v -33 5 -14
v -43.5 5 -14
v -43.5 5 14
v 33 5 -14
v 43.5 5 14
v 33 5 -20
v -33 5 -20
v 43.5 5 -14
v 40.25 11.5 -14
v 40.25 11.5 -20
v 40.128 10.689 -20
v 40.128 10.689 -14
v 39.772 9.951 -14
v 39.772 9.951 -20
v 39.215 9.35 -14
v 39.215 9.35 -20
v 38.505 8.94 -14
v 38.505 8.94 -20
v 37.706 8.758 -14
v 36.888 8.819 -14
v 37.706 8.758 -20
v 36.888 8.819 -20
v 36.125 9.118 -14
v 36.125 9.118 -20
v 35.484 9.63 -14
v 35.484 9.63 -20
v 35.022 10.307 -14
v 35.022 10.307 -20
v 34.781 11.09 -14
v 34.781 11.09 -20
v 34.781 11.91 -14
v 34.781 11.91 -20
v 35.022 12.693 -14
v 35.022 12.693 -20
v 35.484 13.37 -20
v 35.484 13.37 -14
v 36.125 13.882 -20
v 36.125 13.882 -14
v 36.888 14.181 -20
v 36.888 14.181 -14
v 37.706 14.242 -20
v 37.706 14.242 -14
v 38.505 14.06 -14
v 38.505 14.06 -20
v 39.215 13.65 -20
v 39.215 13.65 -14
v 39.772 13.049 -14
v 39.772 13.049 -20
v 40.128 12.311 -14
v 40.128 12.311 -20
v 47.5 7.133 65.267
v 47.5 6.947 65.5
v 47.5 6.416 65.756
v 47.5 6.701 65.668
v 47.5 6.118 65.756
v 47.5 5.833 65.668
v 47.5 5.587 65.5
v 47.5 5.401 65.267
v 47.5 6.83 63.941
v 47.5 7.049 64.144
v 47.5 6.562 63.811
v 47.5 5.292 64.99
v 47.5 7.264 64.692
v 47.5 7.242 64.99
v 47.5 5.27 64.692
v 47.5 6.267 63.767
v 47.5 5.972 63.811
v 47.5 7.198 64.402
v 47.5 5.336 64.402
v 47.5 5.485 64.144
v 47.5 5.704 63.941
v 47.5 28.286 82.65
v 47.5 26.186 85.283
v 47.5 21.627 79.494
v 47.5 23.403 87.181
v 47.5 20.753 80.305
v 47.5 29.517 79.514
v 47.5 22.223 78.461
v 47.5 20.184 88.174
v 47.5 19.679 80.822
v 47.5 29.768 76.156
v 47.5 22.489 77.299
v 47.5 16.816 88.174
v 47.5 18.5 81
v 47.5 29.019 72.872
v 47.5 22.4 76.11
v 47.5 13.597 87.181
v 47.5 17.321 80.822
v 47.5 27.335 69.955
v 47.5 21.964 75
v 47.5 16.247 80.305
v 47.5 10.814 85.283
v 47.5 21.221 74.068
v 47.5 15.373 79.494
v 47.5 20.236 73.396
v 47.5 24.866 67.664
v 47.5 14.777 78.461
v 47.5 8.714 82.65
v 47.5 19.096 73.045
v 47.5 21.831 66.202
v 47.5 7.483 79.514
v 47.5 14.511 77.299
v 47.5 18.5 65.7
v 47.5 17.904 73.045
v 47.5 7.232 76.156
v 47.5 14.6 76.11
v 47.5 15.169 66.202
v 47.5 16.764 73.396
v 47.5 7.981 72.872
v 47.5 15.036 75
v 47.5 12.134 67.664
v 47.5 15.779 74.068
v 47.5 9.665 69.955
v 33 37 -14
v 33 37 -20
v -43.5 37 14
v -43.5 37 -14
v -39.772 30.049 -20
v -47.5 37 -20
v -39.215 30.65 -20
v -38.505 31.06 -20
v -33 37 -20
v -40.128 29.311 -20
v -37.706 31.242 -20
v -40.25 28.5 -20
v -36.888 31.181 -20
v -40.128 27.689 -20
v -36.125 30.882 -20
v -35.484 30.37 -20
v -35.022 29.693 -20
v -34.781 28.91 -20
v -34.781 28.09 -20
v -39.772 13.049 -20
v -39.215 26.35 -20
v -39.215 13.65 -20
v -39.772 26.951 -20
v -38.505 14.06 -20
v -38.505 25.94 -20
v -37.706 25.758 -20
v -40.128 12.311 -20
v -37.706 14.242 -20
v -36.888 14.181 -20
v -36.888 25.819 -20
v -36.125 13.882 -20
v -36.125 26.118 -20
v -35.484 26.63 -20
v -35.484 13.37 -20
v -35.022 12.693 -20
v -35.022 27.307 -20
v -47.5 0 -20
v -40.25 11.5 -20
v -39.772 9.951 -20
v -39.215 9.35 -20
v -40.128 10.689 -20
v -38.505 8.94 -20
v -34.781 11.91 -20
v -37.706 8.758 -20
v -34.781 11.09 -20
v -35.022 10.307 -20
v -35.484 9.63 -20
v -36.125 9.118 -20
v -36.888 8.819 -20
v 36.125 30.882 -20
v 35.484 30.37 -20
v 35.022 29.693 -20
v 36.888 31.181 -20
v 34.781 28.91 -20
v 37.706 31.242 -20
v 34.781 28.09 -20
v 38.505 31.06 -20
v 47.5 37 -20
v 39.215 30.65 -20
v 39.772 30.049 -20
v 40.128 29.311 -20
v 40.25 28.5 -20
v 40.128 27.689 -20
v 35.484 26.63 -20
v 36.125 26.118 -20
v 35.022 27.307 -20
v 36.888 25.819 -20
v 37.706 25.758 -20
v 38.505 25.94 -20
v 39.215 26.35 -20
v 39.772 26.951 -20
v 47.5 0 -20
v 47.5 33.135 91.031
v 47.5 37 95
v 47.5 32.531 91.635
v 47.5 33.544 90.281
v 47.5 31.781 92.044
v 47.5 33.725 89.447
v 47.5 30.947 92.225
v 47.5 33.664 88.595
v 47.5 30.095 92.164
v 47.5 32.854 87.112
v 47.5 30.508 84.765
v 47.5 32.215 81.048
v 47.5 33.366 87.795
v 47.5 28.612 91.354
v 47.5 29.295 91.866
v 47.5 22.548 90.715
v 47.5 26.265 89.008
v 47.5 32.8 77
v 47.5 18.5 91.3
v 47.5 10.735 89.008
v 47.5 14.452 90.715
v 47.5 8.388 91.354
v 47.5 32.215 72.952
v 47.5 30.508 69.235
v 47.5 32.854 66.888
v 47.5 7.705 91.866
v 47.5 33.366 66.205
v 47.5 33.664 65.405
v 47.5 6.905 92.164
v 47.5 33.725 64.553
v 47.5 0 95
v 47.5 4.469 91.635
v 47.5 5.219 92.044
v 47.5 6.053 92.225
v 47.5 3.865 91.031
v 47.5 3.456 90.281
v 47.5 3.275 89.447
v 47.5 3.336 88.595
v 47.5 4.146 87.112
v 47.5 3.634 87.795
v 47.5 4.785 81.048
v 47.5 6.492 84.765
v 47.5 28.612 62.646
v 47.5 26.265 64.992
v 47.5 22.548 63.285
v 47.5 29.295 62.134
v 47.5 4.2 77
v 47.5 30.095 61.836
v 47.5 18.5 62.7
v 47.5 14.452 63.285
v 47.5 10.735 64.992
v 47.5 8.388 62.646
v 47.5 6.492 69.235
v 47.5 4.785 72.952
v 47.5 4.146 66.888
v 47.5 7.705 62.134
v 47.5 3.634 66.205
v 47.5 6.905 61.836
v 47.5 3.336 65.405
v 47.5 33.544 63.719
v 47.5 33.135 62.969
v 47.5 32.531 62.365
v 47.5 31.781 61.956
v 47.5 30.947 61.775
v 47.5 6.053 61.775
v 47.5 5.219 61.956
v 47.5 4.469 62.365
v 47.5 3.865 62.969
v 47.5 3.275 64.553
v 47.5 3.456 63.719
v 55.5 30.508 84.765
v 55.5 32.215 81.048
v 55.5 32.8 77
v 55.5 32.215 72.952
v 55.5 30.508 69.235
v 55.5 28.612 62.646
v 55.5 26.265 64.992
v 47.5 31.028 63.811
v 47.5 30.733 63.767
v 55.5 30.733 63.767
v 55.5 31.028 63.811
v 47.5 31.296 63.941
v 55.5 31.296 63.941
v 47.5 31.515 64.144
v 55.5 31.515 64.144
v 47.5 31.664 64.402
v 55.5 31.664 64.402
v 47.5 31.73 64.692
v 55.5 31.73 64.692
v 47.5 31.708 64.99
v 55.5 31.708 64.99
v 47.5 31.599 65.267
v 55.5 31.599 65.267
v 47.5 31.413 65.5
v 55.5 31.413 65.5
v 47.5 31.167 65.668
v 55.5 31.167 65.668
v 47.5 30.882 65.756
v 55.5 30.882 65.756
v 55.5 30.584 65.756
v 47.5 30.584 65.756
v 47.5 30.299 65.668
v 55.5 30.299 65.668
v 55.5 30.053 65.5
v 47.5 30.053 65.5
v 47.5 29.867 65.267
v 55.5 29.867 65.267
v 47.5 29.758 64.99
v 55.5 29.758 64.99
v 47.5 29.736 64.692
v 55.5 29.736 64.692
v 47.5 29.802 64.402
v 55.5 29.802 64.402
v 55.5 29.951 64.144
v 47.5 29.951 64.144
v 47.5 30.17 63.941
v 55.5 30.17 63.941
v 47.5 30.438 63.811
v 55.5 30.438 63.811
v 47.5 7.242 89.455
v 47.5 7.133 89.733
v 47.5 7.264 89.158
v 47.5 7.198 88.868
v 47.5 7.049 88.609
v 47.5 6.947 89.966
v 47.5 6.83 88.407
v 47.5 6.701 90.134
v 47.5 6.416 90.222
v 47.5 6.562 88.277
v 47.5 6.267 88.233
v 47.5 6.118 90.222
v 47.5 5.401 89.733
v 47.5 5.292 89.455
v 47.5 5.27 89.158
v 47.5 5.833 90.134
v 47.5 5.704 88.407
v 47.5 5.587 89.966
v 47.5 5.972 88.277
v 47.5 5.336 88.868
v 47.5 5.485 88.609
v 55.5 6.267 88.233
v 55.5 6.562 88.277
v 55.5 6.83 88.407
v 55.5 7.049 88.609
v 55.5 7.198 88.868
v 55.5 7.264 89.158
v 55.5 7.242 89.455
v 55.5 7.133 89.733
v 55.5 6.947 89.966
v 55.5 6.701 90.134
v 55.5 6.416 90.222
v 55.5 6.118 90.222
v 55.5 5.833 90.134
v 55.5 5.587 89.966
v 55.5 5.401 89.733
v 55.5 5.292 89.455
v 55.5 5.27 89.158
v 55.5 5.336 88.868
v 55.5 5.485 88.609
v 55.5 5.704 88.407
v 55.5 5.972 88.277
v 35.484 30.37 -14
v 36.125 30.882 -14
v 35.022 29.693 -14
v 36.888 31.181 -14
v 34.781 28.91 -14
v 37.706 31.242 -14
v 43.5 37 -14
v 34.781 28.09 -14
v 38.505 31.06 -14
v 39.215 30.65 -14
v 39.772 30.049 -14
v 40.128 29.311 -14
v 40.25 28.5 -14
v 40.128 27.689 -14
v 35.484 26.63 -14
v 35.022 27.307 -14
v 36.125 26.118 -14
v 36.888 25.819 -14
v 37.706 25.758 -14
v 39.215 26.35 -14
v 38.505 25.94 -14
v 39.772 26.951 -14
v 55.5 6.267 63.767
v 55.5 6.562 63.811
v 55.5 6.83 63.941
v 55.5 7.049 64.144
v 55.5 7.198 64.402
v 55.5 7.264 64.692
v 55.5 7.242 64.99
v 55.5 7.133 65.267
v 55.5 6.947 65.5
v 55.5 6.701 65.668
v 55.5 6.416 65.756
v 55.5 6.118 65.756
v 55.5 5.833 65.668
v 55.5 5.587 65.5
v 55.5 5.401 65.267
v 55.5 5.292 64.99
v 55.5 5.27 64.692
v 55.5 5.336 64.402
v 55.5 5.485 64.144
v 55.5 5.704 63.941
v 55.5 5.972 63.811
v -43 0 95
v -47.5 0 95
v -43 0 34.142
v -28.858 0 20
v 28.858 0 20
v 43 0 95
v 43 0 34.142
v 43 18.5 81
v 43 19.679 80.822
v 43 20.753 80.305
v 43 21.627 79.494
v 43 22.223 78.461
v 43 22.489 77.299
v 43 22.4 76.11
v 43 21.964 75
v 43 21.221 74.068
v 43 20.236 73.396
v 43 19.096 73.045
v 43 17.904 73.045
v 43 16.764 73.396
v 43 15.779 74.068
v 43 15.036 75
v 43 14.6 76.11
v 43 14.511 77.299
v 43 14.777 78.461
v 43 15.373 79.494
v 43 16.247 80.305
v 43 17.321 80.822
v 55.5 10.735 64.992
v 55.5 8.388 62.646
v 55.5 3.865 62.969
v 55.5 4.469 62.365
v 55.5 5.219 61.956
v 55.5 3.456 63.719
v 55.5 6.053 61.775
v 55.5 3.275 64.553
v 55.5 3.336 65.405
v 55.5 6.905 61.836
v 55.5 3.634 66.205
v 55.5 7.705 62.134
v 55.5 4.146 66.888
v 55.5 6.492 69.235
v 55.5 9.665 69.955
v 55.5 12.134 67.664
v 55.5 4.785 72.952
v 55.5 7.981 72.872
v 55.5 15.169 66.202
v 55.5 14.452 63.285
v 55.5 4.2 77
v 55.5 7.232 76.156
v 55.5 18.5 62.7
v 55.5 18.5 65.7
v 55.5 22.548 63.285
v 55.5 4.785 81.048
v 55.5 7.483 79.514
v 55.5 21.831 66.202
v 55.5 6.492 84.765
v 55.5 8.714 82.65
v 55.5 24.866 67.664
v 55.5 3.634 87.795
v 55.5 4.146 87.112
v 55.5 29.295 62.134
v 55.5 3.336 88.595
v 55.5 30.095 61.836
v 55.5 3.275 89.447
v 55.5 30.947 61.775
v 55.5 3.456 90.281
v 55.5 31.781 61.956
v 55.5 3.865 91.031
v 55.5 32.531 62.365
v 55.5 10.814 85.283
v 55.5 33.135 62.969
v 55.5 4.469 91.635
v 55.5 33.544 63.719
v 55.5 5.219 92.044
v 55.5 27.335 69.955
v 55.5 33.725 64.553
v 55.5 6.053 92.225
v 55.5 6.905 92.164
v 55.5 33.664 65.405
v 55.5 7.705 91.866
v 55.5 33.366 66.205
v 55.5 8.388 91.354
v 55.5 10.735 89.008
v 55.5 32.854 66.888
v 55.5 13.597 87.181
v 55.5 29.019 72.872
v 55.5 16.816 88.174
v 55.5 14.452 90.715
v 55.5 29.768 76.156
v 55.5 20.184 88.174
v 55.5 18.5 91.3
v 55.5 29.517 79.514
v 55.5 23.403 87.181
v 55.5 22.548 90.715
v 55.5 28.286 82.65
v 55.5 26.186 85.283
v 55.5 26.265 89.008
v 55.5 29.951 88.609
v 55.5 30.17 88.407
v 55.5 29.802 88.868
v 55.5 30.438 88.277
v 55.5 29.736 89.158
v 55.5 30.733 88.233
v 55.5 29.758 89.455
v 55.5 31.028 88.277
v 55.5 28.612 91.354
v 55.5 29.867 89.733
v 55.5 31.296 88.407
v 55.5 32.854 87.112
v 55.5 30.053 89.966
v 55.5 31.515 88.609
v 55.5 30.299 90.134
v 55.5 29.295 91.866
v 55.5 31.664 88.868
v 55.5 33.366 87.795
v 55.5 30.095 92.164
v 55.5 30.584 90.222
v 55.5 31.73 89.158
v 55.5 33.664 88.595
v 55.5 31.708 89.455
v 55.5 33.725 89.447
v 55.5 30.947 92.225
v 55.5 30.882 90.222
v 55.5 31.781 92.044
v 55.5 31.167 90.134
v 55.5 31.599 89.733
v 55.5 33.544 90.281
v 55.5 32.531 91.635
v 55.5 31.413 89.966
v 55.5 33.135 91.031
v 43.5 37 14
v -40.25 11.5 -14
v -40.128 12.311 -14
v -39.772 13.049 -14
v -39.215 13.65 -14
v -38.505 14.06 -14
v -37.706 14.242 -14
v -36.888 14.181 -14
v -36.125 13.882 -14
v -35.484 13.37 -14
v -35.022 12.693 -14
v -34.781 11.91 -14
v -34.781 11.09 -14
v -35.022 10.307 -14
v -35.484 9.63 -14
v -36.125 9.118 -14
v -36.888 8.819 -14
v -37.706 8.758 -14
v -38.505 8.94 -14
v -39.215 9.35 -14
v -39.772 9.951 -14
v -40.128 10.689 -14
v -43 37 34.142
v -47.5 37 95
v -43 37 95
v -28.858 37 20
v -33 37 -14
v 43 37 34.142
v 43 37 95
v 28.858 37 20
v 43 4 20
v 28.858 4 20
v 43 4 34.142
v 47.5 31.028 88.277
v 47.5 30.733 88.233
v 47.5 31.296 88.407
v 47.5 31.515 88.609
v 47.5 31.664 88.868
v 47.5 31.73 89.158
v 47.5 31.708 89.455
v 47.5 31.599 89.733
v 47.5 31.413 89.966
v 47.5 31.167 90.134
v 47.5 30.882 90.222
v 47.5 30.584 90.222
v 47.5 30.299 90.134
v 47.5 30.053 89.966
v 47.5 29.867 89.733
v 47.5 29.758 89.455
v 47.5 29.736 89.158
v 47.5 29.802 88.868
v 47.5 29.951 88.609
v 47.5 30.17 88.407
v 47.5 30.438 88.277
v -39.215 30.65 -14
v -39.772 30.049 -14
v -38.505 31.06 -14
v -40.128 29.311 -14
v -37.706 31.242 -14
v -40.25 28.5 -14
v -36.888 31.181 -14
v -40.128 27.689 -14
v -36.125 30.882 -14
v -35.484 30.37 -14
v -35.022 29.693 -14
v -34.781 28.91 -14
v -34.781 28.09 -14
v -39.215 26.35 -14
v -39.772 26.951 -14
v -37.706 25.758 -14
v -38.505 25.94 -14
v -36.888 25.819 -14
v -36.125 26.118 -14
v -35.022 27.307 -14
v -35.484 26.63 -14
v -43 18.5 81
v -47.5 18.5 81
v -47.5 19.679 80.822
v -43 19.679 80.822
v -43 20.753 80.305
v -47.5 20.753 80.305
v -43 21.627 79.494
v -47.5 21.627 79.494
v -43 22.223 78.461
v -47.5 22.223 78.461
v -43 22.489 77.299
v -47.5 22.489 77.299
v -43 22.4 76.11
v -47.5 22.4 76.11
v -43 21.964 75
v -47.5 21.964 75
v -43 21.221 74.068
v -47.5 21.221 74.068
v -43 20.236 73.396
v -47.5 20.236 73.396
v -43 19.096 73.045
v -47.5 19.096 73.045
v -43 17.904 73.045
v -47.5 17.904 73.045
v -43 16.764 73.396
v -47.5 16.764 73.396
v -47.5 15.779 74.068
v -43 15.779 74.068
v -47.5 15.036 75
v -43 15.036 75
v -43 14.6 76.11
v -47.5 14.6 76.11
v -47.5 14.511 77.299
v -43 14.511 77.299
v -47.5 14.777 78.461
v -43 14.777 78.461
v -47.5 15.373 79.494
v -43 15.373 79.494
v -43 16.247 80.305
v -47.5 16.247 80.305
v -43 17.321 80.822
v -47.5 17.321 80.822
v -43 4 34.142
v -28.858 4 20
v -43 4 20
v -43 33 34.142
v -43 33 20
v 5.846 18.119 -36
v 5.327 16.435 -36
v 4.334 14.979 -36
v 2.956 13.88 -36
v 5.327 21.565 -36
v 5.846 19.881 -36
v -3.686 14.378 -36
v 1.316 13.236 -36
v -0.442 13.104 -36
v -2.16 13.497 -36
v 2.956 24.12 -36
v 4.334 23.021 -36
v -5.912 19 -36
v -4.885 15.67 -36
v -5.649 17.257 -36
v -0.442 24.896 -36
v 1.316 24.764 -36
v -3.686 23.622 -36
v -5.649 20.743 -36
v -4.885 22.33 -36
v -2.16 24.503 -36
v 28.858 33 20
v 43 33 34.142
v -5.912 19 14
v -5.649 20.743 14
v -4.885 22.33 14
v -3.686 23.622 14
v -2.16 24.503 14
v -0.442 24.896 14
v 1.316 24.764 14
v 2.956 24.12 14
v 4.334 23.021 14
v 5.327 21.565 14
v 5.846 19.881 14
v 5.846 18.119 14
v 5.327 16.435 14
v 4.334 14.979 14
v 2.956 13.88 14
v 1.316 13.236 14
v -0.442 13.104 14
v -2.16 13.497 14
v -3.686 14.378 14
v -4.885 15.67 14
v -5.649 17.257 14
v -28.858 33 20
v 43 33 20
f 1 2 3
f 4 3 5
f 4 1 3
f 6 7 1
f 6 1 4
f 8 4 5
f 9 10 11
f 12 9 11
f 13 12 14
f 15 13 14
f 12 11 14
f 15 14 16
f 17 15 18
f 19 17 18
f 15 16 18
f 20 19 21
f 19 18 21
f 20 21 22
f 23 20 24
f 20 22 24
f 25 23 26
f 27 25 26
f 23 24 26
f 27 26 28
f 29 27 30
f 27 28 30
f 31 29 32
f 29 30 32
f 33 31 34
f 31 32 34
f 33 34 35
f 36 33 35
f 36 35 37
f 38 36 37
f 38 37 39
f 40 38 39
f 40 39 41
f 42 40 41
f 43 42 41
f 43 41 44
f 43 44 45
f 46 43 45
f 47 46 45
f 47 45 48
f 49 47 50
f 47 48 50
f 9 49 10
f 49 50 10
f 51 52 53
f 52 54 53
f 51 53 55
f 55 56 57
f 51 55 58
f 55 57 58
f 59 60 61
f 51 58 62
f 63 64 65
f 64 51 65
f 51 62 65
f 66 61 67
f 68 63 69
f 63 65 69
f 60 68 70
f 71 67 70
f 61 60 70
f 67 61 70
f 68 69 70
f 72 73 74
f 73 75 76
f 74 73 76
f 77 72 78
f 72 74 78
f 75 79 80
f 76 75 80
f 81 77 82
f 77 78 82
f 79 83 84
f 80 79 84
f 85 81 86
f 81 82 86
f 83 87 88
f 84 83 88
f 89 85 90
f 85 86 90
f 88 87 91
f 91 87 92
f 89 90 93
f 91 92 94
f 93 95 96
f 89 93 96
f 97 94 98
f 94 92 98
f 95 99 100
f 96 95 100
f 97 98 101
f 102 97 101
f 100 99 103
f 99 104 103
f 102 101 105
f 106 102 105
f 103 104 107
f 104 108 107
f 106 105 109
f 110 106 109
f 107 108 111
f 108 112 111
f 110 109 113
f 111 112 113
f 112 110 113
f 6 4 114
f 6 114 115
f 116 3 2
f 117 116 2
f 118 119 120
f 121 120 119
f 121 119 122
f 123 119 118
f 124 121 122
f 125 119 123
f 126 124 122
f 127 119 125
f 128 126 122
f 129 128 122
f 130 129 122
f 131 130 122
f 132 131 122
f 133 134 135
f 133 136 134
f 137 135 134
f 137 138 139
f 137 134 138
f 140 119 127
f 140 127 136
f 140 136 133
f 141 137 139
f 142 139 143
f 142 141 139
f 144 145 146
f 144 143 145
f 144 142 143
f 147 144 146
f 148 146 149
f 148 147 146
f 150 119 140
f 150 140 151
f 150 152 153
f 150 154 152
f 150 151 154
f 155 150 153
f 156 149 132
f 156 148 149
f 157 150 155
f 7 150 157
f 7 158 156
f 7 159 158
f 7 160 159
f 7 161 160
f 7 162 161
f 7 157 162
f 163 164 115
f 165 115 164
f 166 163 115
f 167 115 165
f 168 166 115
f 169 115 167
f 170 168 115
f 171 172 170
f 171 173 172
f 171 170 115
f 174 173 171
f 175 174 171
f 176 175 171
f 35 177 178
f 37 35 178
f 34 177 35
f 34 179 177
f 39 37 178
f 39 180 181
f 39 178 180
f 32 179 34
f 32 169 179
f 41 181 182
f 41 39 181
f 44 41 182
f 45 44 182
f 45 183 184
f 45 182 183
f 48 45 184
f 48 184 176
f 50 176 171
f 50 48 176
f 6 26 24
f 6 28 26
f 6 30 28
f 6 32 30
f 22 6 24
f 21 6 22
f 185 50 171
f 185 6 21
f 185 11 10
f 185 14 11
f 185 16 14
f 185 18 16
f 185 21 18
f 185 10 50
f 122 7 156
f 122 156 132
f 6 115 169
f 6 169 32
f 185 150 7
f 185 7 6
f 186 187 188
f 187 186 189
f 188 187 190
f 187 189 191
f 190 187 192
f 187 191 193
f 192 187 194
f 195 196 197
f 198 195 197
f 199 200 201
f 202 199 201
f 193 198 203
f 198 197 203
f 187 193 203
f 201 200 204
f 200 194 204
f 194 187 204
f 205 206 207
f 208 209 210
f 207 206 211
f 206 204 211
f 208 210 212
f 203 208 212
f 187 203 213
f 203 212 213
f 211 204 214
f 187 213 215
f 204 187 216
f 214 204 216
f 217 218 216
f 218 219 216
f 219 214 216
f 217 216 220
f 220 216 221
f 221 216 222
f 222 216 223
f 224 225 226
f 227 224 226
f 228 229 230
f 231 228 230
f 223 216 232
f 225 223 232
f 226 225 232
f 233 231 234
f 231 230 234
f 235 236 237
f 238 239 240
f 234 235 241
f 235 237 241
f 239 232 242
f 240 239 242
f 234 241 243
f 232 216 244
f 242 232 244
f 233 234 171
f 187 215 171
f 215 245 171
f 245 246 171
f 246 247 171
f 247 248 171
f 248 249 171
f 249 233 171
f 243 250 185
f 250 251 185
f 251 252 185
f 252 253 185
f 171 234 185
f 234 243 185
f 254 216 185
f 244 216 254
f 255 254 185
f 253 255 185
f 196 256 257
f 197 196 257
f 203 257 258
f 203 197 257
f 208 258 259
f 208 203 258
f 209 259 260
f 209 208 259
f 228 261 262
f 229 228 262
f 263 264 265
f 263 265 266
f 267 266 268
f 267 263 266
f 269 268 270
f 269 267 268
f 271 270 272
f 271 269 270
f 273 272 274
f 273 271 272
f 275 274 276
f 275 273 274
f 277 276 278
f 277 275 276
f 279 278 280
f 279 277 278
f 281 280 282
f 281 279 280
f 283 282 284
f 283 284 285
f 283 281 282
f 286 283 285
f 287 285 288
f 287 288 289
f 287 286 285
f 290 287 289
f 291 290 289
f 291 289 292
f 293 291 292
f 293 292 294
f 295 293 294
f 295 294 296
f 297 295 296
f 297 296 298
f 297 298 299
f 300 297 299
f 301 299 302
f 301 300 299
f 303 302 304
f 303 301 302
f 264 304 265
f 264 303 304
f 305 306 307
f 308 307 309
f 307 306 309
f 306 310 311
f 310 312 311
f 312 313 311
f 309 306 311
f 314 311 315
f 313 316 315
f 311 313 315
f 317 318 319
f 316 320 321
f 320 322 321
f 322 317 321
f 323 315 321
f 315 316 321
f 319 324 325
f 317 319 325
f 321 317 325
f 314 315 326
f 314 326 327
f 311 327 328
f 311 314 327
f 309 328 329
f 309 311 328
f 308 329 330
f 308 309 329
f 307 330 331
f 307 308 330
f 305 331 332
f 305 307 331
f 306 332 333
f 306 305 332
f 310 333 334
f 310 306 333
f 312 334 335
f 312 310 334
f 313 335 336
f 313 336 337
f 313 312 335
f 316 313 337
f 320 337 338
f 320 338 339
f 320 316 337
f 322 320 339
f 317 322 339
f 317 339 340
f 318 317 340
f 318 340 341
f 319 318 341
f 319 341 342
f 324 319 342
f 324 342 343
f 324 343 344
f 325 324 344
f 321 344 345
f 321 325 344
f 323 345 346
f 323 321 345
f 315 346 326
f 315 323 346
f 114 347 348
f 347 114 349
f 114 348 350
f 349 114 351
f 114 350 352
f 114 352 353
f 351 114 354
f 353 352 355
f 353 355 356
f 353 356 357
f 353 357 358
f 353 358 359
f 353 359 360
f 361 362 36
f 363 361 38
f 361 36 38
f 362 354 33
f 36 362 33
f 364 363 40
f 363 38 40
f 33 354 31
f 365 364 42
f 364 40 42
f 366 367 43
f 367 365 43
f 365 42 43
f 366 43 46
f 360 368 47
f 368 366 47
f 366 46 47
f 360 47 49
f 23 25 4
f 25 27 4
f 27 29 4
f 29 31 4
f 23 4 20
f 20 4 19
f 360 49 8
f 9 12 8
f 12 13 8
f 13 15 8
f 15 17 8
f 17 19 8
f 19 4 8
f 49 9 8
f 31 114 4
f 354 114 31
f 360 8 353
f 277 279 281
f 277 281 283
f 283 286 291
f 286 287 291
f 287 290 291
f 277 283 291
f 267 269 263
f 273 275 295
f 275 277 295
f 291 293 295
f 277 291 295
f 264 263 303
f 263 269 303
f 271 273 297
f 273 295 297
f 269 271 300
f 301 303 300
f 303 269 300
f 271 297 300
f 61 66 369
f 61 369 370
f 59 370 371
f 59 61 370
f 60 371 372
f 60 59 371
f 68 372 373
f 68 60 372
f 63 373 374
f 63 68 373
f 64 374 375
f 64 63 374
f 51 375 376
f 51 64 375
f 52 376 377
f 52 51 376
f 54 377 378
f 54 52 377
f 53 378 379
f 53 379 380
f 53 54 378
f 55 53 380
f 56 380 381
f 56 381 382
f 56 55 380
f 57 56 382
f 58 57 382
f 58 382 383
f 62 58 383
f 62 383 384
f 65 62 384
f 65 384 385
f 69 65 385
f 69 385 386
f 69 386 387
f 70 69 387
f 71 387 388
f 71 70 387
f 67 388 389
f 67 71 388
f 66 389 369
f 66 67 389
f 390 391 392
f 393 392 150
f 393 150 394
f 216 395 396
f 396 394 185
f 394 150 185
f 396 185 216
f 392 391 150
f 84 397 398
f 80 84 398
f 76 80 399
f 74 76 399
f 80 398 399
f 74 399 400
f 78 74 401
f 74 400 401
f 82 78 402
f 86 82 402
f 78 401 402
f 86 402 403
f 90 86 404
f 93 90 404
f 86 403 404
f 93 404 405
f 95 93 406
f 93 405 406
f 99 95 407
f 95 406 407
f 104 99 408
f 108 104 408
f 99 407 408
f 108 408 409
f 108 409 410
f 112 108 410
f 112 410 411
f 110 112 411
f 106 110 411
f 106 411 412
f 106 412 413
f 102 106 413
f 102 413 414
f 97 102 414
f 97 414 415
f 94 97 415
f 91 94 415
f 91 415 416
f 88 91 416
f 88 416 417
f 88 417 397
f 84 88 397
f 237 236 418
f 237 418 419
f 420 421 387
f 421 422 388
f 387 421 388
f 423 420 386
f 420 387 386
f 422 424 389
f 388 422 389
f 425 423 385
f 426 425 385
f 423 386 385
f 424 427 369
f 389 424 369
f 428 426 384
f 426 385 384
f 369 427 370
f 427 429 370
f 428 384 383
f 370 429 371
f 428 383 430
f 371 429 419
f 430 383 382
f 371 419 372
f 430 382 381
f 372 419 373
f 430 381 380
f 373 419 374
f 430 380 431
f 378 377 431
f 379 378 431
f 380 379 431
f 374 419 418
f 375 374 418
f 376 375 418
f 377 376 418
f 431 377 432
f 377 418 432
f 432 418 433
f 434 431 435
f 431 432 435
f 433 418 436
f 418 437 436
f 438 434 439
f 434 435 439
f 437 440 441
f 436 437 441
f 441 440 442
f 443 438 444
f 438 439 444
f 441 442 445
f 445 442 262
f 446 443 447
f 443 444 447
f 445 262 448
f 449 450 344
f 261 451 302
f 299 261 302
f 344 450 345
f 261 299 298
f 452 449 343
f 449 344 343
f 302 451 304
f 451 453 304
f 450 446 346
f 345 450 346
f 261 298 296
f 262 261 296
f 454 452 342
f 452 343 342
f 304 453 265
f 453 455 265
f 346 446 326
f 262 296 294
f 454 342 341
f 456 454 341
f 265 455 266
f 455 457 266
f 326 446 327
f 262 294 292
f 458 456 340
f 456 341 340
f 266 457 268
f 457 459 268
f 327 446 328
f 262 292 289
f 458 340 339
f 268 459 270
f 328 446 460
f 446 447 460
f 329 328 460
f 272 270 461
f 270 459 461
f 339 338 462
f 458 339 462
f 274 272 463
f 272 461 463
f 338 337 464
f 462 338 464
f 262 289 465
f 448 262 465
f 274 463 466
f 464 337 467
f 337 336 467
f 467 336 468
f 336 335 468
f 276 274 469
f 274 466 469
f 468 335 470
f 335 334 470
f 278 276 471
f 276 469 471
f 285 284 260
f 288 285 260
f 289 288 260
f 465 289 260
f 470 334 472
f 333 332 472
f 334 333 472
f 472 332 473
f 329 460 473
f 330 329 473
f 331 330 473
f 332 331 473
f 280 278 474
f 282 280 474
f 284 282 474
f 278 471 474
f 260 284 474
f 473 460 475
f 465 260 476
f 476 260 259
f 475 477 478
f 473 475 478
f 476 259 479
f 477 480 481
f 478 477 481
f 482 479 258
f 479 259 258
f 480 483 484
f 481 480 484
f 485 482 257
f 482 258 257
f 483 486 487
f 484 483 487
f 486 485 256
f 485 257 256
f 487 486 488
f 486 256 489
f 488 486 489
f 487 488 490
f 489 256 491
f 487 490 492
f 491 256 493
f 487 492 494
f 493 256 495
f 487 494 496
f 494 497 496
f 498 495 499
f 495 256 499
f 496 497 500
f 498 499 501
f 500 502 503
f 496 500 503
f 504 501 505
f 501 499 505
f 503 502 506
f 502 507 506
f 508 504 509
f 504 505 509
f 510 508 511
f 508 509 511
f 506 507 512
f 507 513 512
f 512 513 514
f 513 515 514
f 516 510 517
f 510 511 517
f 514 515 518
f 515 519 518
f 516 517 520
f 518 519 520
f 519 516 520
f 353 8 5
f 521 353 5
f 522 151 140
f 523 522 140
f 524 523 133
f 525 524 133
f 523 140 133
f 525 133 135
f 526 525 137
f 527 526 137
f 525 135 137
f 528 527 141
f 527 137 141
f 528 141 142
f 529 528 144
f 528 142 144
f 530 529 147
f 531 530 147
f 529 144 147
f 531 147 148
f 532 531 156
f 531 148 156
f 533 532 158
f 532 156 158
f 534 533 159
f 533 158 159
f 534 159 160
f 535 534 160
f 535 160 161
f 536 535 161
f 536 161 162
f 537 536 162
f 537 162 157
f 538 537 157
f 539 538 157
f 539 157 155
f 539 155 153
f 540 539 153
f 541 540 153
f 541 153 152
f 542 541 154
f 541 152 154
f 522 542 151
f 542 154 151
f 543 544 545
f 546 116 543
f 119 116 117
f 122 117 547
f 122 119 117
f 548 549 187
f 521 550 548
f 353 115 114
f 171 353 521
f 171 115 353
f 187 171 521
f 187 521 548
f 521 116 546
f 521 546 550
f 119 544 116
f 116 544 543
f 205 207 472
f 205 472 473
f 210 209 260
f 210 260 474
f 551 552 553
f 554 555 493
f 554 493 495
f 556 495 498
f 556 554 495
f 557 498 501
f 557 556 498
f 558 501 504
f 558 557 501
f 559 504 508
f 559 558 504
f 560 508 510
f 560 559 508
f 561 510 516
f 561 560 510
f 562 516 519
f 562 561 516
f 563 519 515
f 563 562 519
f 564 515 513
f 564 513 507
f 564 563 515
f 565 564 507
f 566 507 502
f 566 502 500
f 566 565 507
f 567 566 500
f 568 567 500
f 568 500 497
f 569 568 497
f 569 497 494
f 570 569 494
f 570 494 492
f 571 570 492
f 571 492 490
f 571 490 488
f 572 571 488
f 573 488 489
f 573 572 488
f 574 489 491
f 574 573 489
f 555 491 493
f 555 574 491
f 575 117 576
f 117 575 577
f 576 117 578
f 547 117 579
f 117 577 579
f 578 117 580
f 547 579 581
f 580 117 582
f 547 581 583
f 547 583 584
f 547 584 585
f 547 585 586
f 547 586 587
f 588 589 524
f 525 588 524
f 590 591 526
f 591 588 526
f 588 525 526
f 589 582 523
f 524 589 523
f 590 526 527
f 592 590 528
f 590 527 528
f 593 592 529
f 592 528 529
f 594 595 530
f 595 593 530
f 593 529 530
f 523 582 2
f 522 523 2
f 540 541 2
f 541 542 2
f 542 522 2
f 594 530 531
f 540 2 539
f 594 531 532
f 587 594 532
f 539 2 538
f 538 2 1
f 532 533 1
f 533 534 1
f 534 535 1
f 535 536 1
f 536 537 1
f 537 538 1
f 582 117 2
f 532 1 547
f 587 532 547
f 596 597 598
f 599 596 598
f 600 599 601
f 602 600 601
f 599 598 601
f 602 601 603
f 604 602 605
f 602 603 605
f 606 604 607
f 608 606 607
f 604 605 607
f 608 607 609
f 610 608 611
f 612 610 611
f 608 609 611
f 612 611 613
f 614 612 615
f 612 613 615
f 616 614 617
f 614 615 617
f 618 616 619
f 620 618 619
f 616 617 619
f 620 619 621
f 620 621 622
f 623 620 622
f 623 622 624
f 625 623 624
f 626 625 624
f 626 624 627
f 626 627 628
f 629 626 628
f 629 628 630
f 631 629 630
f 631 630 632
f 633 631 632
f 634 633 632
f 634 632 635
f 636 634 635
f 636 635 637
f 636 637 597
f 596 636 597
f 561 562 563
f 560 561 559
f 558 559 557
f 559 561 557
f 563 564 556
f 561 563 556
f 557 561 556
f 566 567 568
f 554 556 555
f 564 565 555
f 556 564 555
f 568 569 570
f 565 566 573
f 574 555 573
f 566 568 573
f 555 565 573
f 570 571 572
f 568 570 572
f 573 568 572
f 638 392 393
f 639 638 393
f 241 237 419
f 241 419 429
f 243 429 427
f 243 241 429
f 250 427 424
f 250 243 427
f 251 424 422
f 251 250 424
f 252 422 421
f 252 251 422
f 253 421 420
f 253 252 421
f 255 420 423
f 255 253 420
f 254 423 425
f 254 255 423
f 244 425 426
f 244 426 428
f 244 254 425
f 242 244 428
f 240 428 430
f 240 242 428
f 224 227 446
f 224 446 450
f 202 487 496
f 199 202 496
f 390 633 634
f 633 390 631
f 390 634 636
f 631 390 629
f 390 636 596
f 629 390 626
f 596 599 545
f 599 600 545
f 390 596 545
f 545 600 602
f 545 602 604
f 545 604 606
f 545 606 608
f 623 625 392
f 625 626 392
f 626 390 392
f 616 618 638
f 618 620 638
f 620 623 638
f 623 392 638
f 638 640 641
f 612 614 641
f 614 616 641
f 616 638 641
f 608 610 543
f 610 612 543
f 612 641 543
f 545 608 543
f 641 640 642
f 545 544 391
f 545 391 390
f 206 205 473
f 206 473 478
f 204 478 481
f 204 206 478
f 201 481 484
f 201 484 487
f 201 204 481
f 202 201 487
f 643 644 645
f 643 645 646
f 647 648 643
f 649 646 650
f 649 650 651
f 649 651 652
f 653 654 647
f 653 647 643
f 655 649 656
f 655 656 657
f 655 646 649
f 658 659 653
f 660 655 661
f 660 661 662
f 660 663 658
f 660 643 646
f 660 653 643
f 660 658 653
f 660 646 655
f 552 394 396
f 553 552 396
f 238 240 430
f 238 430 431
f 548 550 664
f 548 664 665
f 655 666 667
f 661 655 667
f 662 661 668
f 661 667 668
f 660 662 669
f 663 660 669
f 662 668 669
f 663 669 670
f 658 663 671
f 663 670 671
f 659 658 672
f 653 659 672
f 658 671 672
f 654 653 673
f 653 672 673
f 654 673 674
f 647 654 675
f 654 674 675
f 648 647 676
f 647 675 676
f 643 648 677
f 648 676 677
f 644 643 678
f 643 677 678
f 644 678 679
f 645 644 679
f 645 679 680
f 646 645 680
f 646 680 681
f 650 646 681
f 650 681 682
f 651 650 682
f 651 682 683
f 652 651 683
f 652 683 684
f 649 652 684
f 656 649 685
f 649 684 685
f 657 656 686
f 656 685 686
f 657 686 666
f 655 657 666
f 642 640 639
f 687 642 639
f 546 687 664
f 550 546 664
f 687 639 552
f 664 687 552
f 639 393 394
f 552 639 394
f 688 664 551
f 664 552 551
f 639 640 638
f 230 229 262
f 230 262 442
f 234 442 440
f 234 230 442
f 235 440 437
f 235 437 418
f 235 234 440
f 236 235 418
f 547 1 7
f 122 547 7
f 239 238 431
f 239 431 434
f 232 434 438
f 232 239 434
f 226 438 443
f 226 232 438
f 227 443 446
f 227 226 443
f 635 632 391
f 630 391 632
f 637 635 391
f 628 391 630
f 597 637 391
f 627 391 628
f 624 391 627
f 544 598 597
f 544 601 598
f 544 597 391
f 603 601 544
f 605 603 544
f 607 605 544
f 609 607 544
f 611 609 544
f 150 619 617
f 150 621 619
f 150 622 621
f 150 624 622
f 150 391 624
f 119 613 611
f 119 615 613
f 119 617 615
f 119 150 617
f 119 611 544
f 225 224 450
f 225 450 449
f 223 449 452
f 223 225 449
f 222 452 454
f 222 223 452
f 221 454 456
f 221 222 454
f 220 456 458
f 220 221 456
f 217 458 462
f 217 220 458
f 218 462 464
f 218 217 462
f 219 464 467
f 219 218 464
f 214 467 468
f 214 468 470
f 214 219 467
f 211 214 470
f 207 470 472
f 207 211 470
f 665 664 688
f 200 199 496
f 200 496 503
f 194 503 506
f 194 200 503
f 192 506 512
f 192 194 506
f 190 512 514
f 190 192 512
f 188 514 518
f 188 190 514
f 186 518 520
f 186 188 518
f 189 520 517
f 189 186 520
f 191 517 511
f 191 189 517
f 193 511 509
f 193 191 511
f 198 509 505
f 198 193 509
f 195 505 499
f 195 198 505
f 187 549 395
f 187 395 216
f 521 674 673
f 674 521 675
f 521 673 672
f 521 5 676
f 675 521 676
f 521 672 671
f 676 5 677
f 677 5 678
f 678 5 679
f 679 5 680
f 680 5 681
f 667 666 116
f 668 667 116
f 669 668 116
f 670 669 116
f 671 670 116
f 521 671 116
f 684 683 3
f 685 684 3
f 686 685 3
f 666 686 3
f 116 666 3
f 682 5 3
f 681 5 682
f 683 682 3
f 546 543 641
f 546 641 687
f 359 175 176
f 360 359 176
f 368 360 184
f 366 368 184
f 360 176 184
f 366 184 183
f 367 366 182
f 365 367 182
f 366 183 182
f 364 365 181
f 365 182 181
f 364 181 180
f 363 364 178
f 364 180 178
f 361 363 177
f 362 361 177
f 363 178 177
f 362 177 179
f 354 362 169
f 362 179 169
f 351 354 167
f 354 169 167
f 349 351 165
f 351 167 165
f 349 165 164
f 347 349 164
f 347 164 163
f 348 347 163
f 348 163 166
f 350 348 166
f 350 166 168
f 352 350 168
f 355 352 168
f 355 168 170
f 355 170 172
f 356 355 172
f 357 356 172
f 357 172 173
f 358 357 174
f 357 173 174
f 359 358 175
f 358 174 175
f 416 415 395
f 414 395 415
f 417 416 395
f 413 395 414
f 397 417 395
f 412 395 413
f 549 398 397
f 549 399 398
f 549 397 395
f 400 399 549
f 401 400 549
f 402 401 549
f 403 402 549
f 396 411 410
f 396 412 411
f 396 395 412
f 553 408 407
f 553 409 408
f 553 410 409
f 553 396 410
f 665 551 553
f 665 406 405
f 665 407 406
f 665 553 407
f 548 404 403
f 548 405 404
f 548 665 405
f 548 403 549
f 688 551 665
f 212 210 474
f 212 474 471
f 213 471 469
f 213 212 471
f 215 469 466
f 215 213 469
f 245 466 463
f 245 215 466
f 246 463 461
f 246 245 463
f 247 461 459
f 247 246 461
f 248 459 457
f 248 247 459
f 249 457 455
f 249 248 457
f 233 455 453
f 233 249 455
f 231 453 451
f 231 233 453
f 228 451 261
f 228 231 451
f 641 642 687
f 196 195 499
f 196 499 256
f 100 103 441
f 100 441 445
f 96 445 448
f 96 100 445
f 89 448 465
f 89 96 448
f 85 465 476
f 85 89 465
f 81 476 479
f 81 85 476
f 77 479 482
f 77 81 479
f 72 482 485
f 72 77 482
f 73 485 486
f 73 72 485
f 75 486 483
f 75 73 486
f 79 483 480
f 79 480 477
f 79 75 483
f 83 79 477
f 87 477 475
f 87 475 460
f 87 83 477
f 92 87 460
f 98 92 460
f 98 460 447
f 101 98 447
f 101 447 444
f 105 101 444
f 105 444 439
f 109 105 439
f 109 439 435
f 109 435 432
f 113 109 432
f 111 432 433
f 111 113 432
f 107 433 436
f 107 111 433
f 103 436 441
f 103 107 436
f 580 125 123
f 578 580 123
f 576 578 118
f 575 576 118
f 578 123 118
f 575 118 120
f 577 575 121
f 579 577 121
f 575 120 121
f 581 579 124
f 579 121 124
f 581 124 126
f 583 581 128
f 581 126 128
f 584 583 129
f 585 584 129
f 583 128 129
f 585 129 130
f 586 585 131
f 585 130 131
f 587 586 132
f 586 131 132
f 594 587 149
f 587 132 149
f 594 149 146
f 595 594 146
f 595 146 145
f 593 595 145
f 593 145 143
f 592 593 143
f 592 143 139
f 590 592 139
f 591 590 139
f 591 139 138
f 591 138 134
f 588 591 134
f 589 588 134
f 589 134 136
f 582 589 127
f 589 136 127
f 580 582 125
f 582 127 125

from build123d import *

# Parameters (mm, degrees)
SKETCH1_W            = 95
SKETCH1_H            = 40
BOSS_EXTRUDE1_DEPTH  = 5
SKETCH2_W            = 14.5
SKETCH2_H            = 6
BOSS_EXTRUDE2_DEPTH  = 32
SKETCH4_R            = 2.75
CUT_EXTRUDE1_DEPTH   = 6
BOSS_EXTRUDE5_DEPTH  = 32
SKETCH11_W           = 4.5
SKETCH11_H           = 37
BOSS_EXTRUDE6_DEPTH  = 75
SKETCH12_R           = 4
CUT_EXTRUDE3_DEPTH   = 110
BOSS_EXTRUDE9_DEPTH  = 4
SKETCH16_R           = 11.3
SKETCH16_R_2         = 1
BOSS_EXTRUDE11_DEPTH = 8
SKETCH17_R           = 5.912080619
BOSS_EXTRUDE12_DEPTH = 50


with BuildPart() as part:
    # Sketch1 → Boss-Extrude1 (new body)
    with BuildSketch(Plane(origin=(0, 0, 0), x_dir=(1, 0, 0), z_dir=(0, 1, 0))):
        Rectangle(SKETCH1_W, SKETCH1_H)
    extrude(amount=BOSS_EXTRUDE1_DEPTH)

    # Sketch2 → Boss-Extrude2 (add)
    with BuildSketch(Plane(origin=(0, 5, 0), x_dir=(1, 0, 0), z_dir=(0, 1, 0))):
        with Locations((-40.25, 17)):
            Rectangle(SKETCH2_W, SKETCH2_H)
        with Locations((40.25, 17)):
            Rectangle(SKETCH2_W, SKETCH2_H)
    extrude(amount=BOSS_EXTRUDE2_DEPTH)

    # Sketch4 → Cut-Extrude1 (cut)
    with BuildSketch(Plane(origin=(0, 0, -20), x_dir=(-1, 0, 0), z_dir=(0, 0, -1))):
        with Locations((37.5, 11.5)):
            Circle(SKETCH4_R)
        with Locations((37.5, 28.5)):
            Circle(SKETCH4_R)
        with Locations(Location((-37.5, 28.5, 0), (0, 0, 180))):
            Circle(SKETCH4_R)
        with Locations(Location((-37.5, 11.5, 0), (0, 0, 180))):
            Circle(SKETCH4_R)
    extrude(amount=-CUT_EXTRUDE1_DEPTH, mode=Mode.SUBTRACT)

    # Sketch10 → Boss-Extrude5 (add)
    with BuildSketch(Plane(origin=(0, 5, 0), x_dir=(1, 0, 0), z_dir=(0, 1, 0))):
        Polygon((-47.5, -14), (-47.5, -20), (-43.5, -20), (43.5, -20), (47.5, -20), (47.5, -19), (47.5, 14), (43.5, 14), (43.5, -14), (-43.5, -14), (-43.5, 14), (-47.5, 14), align=None)
    extrude(amount=BOSS_EXTRUDE5_DEPTH)

    # Sketch11 → Boss-Extrude6 (add)
    with BuildSketch(Plane.XY.offset(20)):
        with Locations((-45.25, 18.5)):
            Rectangle(SKETCH11_W, SKETCH11_H)
        with Locations((45.25, 18.5)):
            Rectangle(SKETCH11_W, SKETCH11_H)
    extrude(amount=BOSS_EXTRUDE6_DEPTH)

    # Sketch12 → Cut-Extrude3 (cut)
    with BuildSketch(Plane.ZY.offset(47.5)):
        with Locations((77, 18.5)):
            Circle(SKETCH12_R)
    extrude(amount=-CUT_EXTRUDE3_DEPTH, mode=Mode.SUBTRACT)

    # Sketch15 → Boss-Extrude9 (add)
    with BuildSketch(Plane(origin=(0, 37, 0), x_dir=(1, 0, 0), z_dir=(0, 1, 0))):
        Polygon((28.857864376, -20), (43, -34.142135624), (43, -20), align=None)
        Polygon((-28.857864376, -20), (-43, -20), (-43, -34.142135624), align=None)
    boss_extrude9 = extrude(amount=-BOSS_EXTRUDE9_DEPTH)

    # Mirror2: Boss-Extrude9 across plane
    add(boss_extrude9.mirror(Plane.ZX.offset(18.5)))

    # Sketch16 → Boss-Extrude11 (add)
    with BuildSketch(Plane(origin=(47.5, 0, 0), x_dir=(0, 0, -1), z_dir=(1, 0, 0))):
        with BuildLine():
            Line((-66.888373029, 4.145732342), (-69.234713241, 6.492072554))
            ThreePointArc((-69.234713241, 6.492072554), (-77, 4.2), (-84.765286759, 6.492072554))
            Line((-84.765286759, 6.492072554), (-87.111626971, 4.145732342))
            ThreePointArc((-87.111626971, 4.145732342), (-91.354267658, 4.145732342), (-91.354267658, 8.388373029))
            Line((-91.354267658, 8.388373029), (-89.007927446, 10.734713241))
            ThreePointArc((-89.007927446, 10.734713241), (-91.3, 18.5), (-89.007927446, 26.265286759))
            Line((-89.007927446, 26.265286759), (-91.354267658, 28.611626971))
            ThreePointArc((-91.354267658, 28.611626971), (-91.354267658, 32.854267658), (-87.111626971, 32.854267658))
            Line((-87.111626971, 32.854267658), (-84.765286759, 30.507927446))
            ThreePointArc((-84.765286759, 30.507927446), (-77, 32.8), (-69.234713241, 30.507927446))
            Line((-69.234713241, 30.507927446), (-66.888373029, 32.854267658))
            ThreePointArc((-66.888373029, 32.854267658), (-62.645732342, 32.854267658), (-62.645732342, 28.611626971))
            Line((-62.645732342, 28.611626971), (-64.992072554, 26.265286759))
            ThreePointArc((-64.992072554, 26.265286759), (-62.7, 18.5), (-64.992072554, 10.734713241))
            Line((-64.992072554, 10.734713241), (-62.645732342, 8.388373029))
            ThreePointArc((-62.645732342, 8.388373029), (-62.645732342, 4.145732342), (-66.888373029, 4.145732342))
        make_face()
        with Locations((-77, 18.5)):
            Circle(SKETCH16_R, mode=Mode.SUBTRACT)
        with Locations((-64.767052685, 6.267052685)):
            Circle(SKETCH16_R_2, mode=Mode.SUBTRACT)
        with Locations((-89.232947315, 6.267052685)):
            Circle(SKETCH16_R_2, mode=Mode.SUBTRACT)
        with Locations((-89.232947315, 30.732947315)):
            Circle(SKETCH16_R_2, mode=Mode.SUBTRACT)
        with Locations((-64.767052685, 30.732947315)):
            Circle(SKETCH16_R_2, mode=Mode.SUBTRACT)
    extrude(amount=BOSS_EXTRUDE11_DEPTH)

    # Sketch17 → Boss-Extrude12 (add)
    with BuildSketch(Plane(origin=(0, 0, 14), x_dir=(-1, 0, 0), z_dir=(0, 0, -1))):
        with Locations((0, 19)):
            Circle(SKETCH17_R)
    extrude(amount=BOSS_EXTRUDE12_DEPTH)


solid = part.part
